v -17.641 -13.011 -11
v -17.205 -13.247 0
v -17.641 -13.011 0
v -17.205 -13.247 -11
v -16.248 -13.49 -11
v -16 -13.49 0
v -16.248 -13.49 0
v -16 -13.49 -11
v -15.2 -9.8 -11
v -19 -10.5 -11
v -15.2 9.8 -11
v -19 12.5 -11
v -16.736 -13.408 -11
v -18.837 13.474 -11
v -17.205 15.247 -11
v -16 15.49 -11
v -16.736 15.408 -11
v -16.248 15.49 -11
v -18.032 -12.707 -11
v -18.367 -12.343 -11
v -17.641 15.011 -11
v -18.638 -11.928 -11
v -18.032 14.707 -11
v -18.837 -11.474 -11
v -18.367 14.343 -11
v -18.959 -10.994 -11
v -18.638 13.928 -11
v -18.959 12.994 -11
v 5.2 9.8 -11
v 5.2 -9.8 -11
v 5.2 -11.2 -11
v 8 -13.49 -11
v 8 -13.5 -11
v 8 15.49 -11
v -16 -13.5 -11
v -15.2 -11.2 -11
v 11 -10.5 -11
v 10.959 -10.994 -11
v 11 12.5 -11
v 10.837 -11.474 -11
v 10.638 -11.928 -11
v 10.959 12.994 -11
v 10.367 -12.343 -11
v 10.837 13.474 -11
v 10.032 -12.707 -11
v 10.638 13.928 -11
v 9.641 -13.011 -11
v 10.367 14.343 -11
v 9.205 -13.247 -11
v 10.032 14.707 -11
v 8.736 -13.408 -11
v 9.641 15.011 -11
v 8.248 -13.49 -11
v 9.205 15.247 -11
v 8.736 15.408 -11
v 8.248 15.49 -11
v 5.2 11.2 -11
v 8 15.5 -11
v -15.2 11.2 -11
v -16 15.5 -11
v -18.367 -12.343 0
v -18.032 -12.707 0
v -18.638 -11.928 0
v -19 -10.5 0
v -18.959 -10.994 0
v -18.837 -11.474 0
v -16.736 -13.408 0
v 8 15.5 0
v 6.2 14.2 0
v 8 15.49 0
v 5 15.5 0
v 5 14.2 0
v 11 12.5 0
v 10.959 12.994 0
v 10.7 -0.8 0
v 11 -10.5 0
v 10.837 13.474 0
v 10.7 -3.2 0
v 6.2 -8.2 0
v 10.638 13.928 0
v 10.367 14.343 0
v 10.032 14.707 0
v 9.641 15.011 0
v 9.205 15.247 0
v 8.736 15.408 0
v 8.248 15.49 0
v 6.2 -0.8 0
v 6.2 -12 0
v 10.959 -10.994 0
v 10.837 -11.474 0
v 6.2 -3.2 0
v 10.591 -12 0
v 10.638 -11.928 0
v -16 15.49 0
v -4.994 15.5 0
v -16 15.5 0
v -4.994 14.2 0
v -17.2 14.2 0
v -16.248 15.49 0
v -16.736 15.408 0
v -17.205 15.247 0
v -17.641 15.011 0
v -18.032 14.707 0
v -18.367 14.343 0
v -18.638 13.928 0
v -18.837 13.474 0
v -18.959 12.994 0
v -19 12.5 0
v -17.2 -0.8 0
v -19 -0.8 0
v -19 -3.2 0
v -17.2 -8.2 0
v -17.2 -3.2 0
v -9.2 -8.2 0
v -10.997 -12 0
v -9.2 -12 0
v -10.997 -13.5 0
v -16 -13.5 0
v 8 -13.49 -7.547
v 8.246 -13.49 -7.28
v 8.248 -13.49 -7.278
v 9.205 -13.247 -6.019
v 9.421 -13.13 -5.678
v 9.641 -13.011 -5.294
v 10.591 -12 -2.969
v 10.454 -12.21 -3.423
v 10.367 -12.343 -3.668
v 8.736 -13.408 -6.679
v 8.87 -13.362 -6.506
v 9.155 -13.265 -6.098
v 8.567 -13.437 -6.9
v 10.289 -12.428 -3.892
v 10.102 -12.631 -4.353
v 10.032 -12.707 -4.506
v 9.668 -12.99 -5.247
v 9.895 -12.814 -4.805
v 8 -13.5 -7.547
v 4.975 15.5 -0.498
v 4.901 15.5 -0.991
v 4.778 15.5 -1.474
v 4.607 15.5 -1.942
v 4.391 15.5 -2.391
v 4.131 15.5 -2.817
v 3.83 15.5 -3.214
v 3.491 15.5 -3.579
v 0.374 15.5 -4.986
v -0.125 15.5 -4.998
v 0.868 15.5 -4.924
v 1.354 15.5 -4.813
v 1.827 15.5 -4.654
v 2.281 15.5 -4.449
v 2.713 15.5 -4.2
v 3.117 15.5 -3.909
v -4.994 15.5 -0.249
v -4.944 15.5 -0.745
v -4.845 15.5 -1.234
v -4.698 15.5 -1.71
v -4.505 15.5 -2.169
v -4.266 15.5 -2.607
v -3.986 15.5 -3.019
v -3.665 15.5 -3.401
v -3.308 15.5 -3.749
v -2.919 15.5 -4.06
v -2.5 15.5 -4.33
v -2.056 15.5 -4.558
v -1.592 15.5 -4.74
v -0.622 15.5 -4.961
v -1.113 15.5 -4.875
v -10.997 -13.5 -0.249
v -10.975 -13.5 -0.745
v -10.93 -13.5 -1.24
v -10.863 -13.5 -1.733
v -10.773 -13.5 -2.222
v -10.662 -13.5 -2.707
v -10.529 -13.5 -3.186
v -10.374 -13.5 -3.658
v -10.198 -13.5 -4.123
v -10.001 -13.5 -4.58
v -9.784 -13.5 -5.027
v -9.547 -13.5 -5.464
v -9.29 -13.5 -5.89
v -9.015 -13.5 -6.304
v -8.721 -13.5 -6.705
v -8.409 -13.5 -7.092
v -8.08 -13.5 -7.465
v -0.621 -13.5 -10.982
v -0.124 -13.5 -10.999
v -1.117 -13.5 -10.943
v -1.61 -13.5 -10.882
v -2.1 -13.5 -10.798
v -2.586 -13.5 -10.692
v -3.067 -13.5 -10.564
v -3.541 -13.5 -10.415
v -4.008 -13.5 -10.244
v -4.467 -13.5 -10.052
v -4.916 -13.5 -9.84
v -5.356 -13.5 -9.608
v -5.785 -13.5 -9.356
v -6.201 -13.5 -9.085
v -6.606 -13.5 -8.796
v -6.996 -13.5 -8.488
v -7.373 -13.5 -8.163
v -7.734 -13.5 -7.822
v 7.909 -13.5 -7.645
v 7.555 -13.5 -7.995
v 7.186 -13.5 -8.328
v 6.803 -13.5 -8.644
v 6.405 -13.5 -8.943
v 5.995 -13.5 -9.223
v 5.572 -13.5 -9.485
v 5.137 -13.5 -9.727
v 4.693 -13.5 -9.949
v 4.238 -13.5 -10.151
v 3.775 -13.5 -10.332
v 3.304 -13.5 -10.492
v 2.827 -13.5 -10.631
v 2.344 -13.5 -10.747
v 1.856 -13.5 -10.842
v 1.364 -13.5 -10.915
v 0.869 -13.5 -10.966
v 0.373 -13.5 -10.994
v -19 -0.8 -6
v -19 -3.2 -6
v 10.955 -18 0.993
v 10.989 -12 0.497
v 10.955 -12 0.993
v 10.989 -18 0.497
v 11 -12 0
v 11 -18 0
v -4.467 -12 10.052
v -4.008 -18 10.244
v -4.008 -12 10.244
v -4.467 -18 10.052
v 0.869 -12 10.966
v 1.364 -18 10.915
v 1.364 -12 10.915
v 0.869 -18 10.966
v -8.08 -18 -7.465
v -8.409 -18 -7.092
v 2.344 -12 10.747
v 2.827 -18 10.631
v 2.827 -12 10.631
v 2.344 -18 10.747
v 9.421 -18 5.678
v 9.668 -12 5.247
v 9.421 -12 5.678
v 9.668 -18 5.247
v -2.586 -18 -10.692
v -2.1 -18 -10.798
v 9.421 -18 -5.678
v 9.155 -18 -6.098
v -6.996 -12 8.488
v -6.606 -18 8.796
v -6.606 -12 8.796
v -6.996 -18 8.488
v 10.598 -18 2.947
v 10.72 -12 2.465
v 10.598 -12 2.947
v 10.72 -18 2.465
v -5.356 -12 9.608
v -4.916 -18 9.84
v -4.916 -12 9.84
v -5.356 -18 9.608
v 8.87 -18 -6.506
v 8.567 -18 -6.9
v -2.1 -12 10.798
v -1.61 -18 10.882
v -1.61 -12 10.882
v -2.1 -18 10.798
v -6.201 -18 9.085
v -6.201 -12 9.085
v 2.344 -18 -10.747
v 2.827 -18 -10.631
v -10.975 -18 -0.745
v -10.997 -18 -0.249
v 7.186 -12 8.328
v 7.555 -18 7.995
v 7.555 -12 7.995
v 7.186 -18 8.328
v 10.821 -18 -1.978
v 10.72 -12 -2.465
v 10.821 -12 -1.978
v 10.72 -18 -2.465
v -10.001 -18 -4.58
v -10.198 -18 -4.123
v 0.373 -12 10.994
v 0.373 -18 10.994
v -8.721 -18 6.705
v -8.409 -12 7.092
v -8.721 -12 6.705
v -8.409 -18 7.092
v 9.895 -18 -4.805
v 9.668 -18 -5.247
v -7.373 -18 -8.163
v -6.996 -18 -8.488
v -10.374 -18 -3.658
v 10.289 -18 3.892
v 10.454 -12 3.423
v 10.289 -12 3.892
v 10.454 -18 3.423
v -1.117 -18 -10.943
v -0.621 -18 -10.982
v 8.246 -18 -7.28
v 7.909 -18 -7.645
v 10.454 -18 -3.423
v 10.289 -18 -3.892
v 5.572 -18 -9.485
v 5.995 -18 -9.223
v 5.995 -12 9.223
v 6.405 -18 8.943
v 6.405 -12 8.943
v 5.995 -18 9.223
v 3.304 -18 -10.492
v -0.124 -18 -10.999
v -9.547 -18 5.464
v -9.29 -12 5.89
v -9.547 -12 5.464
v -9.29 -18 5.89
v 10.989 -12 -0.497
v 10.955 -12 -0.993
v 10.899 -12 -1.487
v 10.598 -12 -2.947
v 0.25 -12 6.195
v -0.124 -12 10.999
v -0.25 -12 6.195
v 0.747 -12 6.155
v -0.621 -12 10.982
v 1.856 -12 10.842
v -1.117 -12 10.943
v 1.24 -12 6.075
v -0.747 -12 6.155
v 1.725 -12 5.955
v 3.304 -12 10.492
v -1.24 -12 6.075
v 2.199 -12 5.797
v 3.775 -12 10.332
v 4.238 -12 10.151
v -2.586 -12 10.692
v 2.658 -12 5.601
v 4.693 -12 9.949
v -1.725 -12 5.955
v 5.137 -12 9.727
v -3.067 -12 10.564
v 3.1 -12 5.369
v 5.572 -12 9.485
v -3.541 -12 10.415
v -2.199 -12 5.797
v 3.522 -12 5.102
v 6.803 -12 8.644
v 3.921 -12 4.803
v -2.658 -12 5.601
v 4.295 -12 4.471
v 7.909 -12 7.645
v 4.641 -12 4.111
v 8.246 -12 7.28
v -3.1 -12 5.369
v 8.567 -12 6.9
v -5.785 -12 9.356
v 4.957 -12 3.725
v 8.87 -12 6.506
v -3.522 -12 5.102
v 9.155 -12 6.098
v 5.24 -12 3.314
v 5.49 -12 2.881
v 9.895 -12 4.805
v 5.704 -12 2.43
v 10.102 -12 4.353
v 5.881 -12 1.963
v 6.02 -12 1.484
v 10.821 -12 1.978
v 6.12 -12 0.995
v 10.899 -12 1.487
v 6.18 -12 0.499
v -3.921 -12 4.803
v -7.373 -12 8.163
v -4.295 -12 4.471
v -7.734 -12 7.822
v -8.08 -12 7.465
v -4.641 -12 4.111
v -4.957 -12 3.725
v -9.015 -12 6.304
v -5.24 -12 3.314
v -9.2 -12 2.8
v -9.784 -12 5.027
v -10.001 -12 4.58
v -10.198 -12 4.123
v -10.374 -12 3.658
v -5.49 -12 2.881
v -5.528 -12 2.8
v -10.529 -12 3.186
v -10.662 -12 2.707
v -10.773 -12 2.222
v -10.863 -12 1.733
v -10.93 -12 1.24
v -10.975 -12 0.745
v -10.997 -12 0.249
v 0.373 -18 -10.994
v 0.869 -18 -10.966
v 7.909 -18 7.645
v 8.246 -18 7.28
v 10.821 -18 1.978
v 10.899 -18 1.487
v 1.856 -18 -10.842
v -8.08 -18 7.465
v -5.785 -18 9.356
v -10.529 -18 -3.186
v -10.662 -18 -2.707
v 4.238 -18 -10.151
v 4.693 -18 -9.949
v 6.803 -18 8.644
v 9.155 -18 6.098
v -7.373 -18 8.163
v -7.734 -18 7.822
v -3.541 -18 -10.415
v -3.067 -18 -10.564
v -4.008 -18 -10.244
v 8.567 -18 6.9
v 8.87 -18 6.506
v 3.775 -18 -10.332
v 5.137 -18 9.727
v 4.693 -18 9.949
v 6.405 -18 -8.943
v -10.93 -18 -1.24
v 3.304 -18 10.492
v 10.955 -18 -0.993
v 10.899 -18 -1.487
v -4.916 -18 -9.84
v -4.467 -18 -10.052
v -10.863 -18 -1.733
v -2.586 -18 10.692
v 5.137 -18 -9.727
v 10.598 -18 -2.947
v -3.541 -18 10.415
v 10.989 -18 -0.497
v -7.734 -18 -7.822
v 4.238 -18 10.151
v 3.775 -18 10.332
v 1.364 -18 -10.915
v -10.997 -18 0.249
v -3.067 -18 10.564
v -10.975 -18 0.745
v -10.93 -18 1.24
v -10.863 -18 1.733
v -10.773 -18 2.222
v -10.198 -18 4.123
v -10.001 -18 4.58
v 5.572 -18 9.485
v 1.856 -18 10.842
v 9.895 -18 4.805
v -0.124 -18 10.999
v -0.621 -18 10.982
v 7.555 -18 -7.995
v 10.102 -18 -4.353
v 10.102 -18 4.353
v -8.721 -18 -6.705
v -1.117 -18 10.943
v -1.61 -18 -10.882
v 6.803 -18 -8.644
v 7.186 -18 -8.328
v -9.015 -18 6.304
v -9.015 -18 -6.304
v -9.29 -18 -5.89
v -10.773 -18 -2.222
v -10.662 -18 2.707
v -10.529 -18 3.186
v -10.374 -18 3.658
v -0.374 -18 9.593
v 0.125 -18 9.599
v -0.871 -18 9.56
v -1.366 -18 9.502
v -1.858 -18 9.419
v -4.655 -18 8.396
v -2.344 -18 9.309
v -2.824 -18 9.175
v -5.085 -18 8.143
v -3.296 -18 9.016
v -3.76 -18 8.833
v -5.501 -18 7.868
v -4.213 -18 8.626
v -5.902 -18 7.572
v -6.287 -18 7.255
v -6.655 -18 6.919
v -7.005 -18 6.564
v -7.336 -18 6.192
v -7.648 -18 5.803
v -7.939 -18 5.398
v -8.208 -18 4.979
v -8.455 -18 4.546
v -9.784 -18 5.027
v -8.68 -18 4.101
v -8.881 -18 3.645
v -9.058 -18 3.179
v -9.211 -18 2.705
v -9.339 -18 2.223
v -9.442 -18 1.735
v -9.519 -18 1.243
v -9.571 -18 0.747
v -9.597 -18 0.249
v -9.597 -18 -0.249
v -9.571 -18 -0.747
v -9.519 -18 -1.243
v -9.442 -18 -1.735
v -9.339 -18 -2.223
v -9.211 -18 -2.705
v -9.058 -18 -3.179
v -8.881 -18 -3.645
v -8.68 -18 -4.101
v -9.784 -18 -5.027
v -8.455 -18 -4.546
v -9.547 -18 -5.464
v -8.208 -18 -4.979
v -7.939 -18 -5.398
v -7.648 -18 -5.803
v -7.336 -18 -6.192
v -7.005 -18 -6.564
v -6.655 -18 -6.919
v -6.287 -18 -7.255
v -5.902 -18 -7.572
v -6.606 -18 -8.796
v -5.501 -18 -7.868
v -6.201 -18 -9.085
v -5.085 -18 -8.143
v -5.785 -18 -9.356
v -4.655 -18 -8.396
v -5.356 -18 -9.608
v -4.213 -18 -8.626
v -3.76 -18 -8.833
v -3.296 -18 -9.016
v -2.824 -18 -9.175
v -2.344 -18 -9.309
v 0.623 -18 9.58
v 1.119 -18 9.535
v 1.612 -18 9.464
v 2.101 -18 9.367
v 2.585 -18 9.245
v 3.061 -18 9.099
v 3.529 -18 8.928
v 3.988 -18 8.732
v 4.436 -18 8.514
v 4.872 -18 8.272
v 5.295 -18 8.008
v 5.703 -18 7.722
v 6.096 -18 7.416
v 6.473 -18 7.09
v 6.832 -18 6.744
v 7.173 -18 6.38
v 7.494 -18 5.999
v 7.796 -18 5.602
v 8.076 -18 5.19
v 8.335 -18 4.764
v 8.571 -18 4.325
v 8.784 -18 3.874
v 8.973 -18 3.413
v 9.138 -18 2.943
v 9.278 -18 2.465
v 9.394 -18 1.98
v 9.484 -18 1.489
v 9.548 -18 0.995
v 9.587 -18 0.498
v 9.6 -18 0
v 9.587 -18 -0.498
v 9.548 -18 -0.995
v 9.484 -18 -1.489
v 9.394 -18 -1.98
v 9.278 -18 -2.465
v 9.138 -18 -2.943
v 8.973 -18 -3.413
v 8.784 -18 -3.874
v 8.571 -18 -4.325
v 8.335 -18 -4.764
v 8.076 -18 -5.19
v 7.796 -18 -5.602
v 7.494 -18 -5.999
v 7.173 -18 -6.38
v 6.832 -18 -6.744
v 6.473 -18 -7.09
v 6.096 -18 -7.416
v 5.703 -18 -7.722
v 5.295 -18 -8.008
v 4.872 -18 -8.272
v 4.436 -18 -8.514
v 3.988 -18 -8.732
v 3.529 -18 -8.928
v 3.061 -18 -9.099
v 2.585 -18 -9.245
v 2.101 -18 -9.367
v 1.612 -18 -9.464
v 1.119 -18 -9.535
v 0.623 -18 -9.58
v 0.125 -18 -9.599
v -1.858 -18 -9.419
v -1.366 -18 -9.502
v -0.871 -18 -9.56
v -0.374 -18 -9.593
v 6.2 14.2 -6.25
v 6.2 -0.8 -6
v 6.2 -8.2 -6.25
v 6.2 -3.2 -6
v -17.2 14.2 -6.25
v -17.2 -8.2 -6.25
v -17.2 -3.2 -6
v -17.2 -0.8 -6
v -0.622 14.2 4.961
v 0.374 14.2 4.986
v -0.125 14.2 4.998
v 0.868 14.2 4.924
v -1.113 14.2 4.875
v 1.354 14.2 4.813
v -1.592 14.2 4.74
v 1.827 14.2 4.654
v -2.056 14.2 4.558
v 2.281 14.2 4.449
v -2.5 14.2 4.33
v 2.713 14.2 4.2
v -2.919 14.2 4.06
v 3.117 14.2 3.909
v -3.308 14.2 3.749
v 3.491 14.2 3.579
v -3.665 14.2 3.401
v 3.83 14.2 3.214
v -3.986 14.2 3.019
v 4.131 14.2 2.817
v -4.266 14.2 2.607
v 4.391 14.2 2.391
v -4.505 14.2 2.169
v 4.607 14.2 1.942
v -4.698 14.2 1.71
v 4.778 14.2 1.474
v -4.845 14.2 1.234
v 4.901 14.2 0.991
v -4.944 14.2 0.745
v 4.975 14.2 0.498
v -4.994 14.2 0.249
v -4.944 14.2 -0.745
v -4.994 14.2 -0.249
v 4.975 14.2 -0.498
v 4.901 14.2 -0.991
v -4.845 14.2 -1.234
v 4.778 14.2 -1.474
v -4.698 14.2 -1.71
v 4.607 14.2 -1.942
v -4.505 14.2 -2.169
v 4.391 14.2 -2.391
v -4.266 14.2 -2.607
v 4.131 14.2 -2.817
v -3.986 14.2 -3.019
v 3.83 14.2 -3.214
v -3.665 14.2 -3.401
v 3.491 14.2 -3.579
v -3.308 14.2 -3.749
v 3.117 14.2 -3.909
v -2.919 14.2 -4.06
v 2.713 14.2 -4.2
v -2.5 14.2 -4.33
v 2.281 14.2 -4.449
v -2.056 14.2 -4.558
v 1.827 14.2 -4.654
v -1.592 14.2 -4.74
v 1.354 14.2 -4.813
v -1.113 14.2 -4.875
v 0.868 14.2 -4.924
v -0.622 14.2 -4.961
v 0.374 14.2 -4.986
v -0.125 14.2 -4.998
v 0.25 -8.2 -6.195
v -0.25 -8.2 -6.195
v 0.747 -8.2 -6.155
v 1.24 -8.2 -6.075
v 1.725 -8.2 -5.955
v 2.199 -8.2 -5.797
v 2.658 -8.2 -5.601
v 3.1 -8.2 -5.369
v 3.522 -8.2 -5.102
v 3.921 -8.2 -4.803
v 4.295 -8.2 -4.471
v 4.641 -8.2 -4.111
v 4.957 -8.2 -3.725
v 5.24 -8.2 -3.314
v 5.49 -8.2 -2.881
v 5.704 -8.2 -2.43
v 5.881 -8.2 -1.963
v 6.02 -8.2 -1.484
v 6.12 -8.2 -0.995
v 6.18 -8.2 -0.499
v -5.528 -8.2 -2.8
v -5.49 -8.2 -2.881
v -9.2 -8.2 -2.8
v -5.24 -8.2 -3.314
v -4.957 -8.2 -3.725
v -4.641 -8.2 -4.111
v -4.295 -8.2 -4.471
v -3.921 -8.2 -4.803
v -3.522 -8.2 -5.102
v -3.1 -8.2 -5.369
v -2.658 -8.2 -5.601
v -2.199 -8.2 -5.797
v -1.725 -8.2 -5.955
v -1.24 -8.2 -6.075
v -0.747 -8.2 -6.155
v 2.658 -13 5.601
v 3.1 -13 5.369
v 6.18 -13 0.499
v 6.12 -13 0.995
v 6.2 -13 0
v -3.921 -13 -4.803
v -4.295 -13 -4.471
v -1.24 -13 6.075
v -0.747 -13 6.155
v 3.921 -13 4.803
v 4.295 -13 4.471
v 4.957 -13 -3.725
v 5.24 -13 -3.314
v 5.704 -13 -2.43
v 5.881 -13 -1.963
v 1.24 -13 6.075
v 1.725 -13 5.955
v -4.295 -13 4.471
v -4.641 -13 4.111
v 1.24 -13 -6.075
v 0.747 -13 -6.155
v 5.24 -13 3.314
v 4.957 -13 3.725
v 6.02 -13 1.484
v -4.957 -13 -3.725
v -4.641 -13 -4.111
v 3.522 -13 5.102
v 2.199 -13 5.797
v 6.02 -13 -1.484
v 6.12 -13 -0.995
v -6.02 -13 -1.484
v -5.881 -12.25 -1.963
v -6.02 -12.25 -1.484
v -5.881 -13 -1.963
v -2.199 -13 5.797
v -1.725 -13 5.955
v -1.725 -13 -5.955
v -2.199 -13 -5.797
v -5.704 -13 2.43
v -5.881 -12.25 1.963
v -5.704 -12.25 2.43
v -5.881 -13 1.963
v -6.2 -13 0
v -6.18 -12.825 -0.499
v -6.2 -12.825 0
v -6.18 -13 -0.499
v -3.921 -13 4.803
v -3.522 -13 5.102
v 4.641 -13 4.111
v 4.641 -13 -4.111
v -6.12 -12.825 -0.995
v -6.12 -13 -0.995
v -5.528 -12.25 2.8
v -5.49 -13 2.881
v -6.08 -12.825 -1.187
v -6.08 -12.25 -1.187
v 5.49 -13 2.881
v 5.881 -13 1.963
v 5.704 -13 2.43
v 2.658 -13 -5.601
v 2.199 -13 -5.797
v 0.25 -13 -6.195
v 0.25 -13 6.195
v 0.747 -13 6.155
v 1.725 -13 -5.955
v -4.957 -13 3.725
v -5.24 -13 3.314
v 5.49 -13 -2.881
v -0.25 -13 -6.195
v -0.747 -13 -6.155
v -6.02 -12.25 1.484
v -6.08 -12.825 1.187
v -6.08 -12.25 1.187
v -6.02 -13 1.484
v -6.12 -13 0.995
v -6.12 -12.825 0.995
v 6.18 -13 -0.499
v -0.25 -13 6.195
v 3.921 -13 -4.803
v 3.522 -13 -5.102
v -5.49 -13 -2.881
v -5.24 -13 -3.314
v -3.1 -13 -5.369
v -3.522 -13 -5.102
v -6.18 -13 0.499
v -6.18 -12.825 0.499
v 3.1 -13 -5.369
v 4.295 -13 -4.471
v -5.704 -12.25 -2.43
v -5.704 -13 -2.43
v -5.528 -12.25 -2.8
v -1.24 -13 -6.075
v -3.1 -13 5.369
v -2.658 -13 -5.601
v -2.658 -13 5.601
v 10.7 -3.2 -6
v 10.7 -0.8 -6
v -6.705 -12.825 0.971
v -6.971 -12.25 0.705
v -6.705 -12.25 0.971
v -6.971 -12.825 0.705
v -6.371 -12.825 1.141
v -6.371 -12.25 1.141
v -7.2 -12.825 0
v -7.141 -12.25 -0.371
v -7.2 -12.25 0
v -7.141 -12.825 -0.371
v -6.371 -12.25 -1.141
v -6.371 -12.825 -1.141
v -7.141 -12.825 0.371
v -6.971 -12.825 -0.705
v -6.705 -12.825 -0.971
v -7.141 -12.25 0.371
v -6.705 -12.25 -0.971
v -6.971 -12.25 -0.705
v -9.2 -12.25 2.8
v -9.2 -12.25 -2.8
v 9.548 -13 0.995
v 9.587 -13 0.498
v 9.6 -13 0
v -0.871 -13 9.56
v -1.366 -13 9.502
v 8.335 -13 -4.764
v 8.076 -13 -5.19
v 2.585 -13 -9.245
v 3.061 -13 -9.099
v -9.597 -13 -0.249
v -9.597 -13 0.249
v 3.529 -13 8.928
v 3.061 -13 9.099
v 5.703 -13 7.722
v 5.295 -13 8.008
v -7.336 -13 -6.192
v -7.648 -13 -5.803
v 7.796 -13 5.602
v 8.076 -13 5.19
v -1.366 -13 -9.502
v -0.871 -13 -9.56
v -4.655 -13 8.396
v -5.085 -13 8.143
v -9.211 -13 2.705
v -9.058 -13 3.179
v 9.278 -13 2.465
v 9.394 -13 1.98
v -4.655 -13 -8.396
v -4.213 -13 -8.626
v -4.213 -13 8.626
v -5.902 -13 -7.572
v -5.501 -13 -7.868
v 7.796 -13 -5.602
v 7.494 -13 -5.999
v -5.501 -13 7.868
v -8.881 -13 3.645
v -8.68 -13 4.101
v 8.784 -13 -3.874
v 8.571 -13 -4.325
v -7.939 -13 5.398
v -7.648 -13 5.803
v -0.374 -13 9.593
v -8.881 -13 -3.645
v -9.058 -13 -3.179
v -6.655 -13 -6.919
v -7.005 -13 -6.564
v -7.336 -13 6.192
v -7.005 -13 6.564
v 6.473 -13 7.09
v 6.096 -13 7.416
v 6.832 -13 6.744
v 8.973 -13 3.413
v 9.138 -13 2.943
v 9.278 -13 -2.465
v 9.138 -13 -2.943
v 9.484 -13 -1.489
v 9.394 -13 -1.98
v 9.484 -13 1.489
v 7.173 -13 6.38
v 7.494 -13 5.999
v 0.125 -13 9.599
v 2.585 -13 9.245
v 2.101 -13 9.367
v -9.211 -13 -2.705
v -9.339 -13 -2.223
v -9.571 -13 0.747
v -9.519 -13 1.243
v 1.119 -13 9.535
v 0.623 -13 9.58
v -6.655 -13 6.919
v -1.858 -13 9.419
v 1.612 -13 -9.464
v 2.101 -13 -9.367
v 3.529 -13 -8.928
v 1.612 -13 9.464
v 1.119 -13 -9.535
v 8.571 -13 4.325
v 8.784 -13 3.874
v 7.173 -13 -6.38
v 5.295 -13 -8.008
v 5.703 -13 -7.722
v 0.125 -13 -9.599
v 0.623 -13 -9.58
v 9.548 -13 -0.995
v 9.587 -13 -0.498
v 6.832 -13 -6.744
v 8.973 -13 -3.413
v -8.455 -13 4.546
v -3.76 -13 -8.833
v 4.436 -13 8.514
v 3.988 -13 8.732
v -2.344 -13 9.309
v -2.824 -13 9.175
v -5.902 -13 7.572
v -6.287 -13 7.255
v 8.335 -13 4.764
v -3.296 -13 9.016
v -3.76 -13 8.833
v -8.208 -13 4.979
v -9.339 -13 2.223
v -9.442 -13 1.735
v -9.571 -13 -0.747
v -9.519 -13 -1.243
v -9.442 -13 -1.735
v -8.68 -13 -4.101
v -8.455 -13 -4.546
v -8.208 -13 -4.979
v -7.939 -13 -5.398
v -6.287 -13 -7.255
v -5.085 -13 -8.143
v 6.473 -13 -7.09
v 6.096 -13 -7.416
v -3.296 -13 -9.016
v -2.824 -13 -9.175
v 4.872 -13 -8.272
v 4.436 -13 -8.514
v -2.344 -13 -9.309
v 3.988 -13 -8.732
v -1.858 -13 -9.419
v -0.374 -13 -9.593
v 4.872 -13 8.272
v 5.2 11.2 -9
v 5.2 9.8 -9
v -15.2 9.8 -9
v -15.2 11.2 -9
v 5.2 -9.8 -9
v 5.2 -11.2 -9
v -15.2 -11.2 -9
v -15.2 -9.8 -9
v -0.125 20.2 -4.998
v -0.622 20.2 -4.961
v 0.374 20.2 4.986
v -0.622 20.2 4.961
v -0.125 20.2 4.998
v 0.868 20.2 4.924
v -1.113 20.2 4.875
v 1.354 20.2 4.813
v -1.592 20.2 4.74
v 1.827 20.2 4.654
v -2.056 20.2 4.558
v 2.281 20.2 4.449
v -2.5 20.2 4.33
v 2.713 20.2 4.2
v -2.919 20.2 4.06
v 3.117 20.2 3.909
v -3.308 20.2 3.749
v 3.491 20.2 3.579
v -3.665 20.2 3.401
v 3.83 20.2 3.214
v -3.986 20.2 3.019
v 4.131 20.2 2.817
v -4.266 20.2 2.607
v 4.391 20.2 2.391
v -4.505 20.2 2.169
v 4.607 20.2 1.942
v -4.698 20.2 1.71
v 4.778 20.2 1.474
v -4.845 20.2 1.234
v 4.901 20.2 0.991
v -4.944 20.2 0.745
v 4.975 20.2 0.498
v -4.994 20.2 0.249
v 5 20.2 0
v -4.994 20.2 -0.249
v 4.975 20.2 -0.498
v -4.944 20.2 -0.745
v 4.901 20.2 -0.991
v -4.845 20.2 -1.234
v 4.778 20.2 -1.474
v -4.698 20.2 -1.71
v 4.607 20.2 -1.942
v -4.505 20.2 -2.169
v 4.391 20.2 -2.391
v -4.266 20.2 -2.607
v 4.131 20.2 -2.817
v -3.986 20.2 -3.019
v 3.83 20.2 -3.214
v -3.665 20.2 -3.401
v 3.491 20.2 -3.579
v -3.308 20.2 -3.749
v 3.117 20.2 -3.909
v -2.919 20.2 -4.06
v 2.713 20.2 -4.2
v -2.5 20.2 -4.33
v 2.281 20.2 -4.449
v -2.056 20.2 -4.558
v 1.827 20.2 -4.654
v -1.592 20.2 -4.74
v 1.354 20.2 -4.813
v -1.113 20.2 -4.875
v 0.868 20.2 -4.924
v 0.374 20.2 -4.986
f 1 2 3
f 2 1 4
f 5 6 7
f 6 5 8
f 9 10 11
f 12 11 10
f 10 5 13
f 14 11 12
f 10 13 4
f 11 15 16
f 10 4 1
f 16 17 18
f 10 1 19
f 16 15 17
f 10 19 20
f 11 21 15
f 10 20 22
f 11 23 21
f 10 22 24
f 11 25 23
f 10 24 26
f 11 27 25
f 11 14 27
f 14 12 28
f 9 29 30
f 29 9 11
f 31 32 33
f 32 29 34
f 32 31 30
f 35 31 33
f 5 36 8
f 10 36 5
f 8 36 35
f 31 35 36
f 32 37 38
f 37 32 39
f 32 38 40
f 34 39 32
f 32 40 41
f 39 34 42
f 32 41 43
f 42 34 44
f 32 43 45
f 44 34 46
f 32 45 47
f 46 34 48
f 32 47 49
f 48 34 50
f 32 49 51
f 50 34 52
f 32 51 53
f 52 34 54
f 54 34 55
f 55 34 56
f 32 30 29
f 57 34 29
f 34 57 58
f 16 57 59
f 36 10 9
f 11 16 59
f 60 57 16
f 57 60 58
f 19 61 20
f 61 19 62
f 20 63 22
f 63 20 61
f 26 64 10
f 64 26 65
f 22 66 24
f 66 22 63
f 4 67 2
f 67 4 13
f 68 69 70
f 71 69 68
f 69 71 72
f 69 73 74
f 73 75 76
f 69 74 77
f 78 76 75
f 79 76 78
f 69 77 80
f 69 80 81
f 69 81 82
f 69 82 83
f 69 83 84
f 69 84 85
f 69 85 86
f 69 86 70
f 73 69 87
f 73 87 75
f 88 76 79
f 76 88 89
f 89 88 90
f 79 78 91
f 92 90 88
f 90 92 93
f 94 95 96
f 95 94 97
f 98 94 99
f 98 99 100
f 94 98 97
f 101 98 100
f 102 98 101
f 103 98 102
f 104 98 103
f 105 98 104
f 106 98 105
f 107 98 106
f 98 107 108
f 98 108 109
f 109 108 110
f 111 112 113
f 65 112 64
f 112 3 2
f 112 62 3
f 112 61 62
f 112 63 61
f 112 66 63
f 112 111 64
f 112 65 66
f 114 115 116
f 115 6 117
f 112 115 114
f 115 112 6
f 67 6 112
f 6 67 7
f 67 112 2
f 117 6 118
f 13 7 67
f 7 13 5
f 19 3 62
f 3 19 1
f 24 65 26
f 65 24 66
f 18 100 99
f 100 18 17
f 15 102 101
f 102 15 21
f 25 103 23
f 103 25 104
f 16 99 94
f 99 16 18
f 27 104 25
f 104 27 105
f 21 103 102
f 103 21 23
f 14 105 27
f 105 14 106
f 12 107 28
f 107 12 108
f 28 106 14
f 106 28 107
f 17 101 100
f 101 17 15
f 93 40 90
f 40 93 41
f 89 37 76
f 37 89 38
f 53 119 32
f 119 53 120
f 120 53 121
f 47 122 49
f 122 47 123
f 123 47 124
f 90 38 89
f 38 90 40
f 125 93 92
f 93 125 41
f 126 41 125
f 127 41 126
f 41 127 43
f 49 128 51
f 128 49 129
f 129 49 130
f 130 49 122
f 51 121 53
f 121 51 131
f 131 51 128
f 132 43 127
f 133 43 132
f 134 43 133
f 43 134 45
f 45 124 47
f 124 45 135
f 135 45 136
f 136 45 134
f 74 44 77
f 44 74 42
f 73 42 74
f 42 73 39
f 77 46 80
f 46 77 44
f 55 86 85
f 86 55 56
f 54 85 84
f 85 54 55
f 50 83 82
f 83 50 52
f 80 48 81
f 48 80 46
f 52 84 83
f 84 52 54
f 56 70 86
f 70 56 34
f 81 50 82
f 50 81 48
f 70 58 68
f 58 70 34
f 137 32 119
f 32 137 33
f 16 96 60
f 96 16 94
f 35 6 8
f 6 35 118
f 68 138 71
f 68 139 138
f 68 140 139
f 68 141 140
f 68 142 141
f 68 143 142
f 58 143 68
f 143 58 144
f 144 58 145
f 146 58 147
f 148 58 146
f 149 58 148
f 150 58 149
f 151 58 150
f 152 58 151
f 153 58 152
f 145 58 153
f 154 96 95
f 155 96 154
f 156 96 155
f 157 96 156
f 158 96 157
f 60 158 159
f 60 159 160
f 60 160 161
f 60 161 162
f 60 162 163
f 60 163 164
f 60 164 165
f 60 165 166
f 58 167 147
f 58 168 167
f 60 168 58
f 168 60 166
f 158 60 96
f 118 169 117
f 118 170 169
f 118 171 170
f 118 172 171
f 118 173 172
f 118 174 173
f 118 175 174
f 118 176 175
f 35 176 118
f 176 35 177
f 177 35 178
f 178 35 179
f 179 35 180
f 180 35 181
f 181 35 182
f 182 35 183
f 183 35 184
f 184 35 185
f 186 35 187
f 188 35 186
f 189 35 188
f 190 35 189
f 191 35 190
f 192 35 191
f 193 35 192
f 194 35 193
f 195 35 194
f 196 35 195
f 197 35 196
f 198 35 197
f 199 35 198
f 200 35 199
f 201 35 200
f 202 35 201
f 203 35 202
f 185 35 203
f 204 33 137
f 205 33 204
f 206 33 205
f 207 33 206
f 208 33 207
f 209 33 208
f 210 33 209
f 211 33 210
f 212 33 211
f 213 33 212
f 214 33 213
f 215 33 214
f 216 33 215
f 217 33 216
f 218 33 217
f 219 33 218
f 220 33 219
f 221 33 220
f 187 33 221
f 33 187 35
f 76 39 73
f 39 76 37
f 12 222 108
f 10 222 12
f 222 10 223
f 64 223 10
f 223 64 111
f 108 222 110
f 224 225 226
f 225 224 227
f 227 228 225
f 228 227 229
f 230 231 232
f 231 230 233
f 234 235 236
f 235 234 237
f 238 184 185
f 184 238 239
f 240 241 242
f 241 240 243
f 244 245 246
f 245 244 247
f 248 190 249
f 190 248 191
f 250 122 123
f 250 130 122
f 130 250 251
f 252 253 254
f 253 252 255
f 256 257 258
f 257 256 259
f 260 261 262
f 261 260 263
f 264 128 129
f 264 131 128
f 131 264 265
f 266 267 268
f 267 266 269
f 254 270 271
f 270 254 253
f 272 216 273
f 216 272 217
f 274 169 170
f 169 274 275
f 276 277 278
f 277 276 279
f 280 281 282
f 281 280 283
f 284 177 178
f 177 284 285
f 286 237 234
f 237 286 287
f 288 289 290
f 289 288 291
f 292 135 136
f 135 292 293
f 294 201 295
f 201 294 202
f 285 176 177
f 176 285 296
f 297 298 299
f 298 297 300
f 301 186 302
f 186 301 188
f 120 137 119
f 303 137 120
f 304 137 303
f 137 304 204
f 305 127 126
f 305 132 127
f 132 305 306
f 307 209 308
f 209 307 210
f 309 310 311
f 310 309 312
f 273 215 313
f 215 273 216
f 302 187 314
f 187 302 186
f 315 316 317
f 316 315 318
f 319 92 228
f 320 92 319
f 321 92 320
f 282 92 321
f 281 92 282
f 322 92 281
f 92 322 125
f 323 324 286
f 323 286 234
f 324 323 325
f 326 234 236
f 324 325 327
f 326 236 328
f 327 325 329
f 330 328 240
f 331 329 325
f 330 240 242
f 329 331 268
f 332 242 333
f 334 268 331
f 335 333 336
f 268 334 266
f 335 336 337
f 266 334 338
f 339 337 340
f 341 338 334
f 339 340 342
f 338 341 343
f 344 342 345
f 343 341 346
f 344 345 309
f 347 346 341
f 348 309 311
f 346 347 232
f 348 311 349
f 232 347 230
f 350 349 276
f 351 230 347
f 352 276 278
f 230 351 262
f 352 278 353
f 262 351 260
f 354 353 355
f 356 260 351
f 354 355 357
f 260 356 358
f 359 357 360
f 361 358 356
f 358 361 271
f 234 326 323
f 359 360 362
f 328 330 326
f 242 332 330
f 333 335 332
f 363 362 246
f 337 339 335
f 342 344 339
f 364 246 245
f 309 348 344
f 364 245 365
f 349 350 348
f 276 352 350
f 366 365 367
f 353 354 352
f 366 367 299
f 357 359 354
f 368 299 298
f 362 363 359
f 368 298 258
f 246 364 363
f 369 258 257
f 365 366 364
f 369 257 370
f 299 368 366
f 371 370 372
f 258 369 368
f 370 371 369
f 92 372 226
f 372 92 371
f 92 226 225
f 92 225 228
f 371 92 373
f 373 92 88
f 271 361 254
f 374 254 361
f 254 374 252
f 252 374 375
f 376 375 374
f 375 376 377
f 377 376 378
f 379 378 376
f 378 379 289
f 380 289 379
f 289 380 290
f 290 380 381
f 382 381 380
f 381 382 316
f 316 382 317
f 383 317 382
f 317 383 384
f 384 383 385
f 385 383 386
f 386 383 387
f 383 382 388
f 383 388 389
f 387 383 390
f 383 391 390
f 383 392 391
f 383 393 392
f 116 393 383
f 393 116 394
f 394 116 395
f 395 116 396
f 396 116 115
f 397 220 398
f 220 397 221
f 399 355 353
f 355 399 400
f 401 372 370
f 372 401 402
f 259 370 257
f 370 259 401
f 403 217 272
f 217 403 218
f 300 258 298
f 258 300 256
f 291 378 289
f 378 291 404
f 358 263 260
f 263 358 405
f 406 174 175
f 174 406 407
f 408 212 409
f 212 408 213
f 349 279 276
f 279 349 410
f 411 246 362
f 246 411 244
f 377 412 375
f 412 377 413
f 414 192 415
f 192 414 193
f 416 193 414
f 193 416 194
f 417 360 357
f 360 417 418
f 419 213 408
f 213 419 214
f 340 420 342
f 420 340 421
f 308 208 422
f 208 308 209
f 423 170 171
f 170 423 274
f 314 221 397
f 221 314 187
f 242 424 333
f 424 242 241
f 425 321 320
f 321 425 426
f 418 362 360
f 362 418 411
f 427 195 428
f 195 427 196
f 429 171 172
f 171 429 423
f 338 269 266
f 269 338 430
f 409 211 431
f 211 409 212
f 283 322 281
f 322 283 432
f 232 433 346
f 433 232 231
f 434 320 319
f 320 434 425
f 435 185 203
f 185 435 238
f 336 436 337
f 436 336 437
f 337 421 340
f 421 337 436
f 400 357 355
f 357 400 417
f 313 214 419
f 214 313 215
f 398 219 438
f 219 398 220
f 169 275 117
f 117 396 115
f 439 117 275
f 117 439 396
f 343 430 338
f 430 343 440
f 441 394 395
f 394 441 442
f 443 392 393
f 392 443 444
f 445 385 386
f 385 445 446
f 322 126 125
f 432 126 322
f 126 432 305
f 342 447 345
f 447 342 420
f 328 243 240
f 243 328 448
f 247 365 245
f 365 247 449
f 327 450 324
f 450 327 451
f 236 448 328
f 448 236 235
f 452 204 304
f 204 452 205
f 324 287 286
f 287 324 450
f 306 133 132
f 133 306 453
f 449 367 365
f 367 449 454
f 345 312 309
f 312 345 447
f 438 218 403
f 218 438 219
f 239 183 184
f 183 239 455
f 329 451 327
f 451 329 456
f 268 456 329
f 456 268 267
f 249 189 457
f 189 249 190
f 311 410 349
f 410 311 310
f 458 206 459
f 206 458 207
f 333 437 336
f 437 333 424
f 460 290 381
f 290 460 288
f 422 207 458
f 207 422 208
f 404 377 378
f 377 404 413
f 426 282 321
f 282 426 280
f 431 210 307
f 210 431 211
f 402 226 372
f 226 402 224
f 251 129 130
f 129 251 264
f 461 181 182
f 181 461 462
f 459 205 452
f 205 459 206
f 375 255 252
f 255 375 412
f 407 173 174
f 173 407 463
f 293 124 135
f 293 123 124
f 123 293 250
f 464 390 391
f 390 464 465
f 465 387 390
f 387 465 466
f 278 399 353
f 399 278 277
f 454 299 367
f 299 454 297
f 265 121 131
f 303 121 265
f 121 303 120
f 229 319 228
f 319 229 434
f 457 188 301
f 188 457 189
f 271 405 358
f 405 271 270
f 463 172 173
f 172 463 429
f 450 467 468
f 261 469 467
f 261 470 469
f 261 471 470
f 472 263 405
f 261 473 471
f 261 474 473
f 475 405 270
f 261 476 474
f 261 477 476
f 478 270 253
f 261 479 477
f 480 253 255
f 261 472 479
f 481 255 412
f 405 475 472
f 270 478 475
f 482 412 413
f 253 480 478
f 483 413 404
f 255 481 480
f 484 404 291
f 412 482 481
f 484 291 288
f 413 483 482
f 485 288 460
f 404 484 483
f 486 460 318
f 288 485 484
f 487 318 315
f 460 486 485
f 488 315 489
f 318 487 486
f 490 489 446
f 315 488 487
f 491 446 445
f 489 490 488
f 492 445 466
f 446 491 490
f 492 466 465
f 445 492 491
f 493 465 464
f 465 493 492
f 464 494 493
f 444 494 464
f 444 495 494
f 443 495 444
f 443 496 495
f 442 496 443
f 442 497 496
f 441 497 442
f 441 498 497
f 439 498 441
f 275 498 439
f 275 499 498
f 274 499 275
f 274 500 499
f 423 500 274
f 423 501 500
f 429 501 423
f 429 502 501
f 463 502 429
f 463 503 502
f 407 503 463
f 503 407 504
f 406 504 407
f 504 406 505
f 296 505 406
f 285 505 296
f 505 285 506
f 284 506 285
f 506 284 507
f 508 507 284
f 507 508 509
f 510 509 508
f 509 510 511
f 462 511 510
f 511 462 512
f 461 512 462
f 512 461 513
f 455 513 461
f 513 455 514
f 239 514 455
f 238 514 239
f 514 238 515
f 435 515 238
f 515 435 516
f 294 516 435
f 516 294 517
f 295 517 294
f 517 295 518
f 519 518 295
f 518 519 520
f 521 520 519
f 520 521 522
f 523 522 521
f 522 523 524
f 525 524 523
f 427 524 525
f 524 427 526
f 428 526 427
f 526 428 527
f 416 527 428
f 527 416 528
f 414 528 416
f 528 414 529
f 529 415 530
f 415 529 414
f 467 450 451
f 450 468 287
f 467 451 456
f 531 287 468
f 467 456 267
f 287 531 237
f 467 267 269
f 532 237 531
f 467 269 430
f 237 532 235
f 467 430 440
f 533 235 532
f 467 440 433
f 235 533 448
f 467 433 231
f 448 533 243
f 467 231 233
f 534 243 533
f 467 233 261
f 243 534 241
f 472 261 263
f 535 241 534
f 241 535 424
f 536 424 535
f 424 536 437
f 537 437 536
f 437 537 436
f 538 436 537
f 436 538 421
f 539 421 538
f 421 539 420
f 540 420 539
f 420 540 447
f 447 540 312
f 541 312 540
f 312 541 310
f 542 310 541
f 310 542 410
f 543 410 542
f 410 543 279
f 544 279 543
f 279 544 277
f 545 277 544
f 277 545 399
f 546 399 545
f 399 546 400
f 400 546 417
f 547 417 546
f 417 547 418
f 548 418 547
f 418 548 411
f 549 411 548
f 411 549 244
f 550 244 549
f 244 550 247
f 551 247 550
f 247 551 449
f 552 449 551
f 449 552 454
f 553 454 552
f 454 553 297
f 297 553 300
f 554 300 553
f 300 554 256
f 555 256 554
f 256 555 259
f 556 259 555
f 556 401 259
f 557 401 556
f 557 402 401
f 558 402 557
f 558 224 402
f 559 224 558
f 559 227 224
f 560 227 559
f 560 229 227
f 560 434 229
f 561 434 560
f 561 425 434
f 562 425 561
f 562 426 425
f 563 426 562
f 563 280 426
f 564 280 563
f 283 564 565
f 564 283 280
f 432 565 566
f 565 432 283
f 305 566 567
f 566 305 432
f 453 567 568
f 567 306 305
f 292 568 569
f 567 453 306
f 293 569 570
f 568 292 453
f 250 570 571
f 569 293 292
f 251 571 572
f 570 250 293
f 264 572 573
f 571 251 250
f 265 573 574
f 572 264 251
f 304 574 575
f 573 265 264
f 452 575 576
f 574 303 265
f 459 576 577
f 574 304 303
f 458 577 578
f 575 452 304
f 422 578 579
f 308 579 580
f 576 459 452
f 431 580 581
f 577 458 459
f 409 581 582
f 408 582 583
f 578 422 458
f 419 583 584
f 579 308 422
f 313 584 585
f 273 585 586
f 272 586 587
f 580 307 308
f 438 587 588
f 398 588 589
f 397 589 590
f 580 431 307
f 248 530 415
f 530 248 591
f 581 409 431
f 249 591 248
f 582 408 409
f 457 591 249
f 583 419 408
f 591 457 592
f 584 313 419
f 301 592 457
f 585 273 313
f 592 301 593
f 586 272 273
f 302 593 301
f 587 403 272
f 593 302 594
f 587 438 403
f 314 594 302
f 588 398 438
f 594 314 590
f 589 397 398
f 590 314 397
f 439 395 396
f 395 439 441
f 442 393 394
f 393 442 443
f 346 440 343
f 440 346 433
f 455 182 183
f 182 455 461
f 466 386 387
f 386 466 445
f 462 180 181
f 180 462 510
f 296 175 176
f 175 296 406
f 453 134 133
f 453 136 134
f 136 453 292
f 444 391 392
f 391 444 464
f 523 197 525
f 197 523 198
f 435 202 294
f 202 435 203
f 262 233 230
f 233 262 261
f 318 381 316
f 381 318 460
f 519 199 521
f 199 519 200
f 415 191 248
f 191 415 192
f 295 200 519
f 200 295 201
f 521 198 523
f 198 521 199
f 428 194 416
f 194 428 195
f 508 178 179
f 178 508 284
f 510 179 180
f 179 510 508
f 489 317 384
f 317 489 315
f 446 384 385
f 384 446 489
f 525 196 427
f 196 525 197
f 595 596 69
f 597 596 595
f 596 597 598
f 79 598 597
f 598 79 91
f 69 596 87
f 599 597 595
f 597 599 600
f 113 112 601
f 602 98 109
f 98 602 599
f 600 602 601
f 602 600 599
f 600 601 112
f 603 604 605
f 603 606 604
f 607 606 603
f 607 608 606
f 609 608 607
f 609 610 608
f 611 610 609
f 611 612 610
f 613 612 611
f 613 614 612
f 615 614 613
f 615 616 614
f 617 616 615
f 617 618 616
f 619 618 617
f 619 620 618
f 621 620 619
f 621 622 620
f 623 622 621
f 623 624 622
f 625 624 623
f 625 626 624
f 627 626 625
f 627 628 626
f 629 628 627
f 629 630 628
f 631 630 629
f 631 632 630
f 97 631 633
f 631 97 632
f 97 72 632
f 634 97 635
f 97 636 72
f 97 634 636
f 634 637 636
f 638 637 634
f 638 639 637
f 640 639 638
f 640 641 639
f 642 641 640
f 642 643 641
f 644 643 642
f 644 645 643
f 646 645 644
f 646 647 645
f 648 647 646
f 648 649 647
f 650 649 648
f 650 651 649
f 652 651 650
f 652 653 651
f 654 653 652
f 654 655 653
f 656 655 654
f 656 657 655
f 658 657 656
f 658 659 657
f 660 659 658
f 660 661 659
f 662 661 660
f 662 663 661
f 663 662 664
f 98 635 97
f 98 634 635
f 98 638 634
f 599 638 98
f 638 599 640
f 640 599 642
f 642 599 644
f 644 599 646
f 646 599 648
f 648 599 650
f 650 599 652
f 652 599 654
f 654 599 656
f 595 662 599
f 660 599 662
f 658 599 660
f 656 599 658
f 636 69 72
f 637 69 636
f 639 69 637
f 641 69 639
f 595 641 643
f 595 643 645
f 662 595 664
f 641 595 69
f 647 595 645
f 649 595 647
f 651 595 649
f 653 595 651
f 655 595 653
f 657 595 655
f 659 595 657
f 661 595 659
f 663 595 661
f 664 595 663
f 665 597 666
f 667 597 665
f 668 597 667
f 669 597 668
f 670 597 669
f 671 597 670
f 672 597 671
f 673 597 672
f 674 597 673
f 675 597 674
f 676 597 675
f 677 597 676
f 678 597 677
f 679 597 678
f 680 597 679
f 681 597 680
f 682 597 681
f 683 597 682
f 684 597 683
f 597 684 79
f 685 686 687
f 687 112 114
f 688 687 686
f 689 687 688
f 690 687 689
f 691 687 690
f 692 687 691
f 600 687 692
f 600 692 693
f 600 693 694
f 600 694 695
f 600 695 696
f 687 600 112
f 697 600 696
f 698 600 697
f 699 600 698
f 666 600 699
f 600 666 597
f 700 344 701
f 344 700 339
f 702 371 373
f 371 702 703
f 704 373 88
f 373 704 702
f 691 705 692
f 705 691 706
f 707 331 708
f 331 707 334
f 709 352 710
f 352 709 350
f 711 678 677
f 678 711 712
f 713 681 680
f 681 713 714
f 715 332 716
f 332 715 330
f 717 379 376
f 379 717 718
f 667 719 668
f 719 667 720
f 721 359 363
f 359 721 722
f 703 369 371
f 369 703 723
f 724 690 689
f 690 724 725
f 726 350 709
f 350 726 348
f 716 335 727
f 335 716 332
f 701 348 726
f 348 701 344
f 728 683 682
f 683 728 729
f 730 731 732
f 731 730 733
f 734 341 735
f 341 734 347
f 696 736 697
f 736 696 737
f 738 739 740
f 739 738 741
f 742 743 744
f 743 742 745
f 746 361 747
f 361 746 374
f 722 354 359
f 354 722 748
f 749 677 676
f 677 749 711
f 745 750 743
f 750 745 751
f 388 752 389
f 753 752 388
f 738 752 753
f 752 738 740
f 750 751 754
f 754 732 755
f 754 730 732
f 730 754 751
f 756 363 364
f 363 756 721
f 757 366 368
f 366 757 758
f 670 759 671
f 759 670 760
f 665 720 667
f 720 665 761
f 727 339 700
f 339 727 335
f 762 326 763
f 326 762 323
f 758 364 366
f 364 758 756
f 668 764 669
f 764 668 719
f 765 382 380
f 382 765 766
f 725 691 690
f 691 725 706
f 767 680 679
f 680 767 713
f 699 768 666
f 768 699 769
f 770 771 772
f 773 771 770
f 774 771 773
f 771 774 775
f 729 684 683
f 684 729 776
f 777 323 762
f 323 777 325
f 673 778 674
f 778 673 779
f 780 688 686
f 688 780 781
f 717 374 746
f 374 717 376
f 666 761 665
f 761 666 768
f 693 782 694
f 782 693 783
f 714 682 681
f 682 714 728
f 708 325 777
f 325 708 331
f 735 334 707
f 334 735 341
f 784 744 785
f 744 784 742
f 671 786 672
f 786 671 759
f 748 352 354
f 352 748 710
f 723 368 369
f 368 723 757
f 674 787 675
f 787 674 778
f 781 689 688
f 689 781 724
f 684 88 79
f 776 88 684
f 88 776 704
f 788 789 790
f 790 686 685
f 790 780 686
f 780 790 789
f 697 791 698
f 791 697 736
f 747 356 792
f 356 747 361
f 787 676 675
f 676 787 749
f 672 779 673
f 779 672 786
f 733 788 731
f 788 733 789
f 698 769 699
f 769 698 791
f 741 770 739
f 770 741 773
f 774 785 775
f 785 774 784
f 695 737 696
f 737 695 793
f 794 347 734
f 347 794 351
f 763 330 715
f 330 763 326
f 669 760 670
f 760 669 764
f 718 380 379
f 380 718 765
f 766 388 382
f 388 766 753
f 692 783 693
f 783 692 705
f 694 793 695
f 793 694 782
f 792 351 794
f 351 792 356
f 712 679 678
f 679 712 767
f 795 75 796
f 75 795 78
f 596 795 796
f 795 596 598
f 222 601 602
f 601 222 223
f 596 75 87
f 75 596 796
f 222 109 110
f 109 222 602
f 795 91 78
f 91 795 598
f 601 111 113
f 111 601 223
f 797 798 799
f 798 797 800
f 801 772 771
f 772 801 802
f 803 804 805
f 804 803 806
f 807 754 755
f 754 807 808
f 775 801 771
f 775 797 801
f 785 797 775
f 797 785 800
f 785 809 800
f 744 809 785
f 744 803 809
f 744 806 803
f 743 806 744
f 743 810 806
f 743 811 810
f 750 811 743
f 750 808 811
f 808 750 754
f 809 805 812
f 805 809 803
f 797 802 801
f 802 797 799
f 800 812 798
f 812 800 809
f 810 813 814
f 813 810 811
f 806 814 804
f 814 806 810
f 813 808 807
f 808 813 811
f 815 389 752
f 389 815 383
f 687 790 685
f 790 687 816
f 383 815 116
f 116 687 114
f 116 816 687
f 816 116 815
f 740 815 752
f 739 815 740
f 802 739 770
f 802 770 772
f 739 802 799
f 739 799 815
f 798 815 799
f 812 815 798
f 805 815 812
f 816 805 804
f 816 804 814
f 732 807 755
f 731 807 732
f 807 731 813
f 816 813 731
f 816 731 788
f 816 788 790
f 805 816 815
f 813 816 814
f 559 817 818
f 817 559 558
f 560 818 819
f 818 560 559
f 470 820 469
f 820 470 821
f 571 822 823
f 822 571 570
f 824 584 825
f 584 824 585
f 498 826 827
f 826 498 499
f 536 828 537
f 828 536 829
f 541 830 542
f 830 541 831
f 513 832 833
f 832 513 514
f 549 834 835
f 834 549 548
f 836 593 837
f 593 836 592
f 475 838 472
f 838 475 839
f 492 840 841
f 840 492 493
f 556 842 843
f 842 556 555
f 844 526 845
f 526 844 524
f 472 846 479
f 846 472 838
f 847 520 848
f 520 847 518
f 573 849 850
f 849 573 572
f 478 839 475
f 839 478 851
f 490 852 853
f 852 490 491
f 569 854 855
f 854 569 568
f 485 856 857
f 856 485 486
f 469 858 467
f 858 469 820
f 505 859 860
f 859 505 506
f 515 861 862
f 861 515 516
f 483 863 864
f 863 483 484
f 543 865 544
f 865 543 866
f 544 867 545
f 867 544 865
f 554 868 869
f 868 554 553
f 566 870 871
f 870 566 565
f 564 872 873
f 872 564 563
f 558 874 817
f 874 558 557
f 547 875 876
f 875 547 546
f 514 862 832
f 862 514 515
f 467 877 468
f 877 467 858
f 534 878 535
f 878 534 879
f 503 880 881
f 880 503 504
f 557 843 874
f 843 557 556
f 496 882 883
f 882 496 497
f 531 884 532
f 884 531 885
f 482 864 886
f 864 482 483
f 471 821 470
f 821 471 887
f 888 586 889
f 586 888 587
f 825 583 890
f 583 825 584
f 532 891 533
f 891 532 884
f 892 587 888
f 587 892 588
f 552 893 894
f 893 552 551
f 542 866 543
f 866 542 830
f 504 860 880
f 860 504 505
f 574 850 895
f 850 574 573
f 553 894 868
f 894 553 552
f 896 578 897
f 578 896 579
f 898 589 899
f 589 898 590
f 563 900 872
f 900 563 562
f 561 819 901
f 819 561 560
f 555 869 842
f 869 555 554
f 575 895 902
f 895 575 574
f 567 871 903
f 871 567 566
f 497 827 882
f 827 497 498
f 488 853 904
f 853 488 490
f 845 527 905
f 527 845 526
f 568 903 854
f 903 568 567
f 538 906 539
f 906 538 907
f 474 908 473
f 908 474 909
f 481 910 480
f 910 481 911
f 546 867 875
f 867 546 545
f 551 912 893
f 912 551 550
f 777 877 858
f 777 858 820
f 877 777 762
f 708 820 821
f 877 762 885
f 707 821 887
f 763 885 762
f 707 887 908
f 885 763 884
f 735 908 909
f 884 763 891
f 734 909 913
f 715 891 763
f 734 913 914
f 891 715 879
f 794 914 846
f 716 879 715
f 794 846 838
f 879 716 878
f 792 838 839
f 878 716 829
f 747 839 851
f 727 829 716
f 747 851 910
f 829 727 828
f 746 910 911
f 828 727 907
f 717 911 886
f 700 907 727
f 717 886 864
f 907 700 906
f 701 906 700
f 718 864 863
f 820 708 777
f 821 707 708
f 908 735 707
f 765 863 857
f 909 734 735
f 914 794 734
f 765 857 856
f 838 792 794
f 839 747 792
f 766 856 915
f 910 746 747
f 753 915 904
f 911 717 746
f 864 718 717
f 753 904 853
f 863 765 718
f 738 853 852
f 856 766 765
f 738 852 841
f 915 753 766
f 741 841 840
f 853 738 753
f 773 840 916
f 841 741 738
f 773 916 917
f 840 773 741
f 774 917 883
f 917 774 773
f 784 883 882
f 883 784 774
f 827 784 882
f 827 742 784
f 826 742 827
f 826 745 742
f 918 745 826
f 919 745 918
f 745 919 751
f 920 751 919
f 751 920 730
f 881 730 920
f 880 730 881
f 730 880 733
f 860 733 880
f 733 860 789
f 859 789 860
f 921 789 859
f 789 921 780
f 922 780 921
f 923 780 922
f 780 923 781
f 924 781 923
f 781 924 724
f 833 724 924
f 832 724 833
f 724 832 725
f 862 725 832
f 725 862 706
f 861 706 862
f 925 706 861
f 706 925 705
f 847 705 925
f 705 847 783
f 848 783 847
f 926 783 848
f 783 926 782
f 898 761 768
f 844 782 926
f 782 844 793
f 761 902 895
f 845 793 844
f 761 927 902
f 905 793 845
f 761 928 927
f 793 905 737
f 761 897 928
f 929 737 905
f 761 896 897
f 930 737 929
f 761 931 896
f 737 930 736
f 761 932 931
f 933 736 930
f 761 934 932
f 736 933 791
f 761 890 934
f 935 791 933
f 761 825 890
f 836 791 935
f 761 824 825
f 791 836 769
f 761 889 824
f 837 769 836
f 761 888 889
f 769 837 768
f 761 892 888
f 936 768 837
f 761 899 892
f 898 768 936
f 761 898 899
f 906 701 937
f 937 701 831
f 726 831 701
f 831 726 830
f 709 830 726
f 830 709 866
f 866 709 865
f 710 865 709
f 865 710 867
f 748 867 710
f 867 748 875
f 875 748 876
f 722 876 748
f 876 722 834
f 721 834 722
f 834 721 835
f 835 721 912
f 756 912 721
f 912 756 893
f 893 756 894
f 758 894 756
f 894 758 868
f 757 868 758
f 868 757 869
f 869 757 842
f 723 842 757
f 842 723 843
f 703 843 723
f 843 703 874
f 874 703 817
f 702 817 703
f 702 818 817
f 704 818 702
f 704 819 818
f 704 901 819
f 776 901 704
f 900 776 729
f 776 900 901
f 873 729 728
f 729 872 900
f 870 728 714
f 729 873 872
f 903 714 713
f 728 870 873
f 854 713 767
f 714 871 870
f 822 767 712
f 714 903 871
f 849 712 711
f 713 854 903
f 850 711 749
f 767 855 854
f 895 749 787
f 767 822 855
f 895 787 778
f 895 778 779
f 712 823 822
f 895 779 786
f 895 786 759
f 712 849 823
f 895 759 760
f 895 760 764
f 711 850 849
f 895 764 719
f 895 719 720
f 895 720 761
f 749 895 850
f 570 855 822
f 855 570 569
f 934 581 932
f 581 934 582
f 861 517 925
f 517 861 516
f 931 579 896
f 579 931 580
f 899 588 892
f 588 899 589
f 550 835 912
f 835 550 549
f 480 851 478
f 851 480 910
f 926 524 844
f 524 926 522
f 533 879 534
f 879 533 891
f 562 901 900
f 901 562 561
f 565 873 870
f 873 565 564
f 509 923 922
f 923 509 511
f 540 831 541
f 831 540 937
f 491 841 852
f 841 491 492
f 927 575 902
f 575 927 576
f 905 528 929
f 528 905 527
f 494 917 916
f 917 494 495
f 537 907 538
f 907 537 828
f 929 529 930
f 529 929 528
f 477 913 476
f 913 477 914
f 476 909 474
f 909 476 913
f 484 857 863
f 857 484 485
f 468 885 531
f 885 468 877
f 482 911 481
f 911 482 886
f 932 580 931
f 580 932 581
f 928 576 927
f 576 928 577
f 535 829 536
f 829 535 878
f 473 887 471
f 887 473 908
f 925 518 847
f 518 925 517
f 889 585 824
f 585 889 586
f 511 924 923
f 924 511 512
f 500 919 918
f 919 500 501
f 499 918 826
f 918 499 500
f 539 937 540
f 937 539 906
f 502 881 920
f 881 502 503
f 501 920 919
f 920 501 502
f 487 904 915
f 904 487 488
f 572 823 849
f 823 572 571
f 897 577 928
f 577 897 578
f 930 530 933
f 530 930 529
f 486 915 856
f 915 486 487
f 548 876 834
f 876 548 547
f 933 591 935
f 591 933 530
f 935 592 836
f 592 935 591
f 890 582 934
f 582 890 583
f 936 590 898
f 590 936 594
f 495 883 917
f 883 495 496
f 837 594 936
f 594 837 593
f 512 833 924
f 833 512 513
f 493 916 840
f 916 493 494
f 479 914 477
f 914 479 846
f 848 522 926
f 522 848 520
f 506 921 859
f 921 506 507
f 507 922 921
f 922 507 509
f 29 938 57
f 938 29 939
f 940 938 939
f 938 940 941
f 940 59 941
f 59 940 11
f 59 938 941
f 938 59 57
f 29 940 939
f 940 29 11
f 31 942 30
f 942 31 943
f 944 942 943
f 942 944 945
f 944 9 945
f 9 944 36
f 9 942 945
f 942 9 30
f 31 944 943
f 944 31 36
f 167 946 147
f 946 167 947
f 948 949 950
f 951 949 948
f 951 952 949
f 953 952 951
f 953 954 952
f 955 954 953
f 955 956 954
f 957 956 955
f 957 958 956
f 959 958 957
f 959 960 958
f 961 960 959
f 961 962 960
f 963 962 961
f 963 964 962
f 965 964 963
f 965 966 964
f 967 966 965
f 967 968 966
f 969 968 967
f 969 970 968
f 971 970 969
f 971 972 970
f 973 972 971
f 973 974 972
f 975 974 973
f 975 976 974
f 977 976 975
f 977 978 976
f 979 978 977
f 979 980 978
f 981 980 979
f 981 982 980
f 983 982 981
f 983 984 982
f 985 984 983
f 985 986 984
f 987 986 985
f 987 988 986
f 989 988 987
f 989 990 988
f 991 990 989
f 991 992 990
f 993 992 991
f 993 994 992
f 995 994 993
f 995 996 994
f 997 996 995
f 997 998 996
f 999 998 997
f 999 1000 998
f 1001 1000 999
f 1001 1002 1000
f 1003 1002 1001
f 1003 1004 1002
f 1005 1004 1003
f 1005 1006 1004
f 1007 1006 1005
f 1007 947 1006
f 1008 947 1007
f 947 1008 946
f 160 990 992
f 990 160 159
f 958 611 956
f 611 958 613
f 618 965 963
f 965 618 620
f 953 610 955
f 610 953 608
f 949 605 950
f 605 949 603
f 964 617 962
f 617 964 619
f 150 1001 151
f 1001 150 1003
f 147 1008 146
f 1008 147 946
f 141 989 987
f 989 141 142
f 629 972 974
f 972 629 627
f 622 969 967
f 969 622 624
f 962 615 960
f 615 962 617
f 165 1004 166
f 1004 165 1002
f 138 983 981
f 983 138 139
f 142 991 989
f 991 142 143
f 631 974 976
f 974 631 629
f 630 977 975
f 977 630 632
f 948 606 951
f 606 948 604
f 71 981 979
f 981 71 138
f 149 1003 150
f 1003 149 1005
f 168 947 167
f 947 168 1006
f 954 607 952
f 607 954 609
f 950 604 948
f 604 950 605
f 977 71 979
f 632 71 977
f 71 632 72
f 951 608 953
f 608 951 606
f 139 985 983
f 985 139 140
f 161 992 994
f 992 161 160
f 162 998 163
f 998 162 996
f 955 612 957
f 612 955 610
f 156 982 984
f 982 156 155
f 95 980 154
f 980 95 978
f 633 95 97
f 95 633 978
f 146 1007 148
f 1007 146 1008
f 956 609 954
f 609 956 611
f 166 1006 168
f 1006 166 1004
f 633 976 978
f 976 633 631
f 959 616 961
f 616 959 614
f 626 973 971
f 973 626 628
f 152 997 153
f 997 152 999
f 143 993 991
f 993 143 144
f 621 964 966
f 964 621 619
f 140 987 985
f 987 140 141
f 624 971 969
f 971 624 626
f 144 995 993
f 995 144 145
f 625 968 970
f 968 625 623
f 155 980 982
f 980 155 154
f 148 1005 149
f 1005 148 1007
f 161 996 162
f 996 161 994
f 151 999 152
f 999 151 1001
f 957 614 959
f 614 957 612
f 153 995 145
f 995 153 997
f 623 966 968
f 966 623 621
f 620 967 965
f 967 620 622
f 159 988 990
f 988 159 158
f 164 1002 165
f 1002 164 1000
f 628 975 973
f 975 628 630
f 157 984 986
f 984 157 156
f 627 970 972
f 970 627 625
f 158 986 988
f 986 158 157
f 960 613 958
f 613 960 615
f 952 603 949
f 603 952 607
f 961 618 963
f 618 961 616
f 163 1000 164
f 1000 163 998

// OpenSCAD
use <MCAD/boxes.scad>
$fs = 0.5;
$fa=1;


module in_eye_joint_inner() {
    difference(){
        union(){
            //translate([0,0,-11])
            //cylinder(r=17,h=11);
            translate([-4,1,-5.5])
            roundedBox([30,29,11], radius=3, sidesonly=true);
            rotate([90,0,0])
            translate([0,0,12])
            cylinder(r=11, h=6);         
        }
        translate([-5.5,3,0])
        cube([23.4,22.4,12.5], center=true);
        rotate([90,0,0])
        cylinder(r=6.2,h=26);
        
        translate([-5.5,-2,0]) cube([32.4,2.4,12], center=true);
    
        translate([-5.5,2.8,0])
     rotate([90,0,0])
        translate([-0.5,0,2.75]) cylinder(r=1.2, h=25.75, $fn=20, center=true);
       
        translate([-6.5,0,0])
        cube([5.4,24.5,5.6], center=true);
        rotate([90,0,0])
        translate([0,0,13])
        cylinder(r=9.6, h=12);
        
        rotate([-90,0,0])
        translate([0,0,15.8])
        cylinder(r=14, h=12);
        
        translate([-5,10.5,-11])
        cube([20.4,1.4,4], center=true);
        
        translate([-5,-10.5,-11])
        cube([20.4,1.4,4], center=true);
    }
    
    rotate([-90,0,0])
    translate([0,0,14.2])
    cylinder(r=5,h=6);
}

in_eye_joint_inner();
